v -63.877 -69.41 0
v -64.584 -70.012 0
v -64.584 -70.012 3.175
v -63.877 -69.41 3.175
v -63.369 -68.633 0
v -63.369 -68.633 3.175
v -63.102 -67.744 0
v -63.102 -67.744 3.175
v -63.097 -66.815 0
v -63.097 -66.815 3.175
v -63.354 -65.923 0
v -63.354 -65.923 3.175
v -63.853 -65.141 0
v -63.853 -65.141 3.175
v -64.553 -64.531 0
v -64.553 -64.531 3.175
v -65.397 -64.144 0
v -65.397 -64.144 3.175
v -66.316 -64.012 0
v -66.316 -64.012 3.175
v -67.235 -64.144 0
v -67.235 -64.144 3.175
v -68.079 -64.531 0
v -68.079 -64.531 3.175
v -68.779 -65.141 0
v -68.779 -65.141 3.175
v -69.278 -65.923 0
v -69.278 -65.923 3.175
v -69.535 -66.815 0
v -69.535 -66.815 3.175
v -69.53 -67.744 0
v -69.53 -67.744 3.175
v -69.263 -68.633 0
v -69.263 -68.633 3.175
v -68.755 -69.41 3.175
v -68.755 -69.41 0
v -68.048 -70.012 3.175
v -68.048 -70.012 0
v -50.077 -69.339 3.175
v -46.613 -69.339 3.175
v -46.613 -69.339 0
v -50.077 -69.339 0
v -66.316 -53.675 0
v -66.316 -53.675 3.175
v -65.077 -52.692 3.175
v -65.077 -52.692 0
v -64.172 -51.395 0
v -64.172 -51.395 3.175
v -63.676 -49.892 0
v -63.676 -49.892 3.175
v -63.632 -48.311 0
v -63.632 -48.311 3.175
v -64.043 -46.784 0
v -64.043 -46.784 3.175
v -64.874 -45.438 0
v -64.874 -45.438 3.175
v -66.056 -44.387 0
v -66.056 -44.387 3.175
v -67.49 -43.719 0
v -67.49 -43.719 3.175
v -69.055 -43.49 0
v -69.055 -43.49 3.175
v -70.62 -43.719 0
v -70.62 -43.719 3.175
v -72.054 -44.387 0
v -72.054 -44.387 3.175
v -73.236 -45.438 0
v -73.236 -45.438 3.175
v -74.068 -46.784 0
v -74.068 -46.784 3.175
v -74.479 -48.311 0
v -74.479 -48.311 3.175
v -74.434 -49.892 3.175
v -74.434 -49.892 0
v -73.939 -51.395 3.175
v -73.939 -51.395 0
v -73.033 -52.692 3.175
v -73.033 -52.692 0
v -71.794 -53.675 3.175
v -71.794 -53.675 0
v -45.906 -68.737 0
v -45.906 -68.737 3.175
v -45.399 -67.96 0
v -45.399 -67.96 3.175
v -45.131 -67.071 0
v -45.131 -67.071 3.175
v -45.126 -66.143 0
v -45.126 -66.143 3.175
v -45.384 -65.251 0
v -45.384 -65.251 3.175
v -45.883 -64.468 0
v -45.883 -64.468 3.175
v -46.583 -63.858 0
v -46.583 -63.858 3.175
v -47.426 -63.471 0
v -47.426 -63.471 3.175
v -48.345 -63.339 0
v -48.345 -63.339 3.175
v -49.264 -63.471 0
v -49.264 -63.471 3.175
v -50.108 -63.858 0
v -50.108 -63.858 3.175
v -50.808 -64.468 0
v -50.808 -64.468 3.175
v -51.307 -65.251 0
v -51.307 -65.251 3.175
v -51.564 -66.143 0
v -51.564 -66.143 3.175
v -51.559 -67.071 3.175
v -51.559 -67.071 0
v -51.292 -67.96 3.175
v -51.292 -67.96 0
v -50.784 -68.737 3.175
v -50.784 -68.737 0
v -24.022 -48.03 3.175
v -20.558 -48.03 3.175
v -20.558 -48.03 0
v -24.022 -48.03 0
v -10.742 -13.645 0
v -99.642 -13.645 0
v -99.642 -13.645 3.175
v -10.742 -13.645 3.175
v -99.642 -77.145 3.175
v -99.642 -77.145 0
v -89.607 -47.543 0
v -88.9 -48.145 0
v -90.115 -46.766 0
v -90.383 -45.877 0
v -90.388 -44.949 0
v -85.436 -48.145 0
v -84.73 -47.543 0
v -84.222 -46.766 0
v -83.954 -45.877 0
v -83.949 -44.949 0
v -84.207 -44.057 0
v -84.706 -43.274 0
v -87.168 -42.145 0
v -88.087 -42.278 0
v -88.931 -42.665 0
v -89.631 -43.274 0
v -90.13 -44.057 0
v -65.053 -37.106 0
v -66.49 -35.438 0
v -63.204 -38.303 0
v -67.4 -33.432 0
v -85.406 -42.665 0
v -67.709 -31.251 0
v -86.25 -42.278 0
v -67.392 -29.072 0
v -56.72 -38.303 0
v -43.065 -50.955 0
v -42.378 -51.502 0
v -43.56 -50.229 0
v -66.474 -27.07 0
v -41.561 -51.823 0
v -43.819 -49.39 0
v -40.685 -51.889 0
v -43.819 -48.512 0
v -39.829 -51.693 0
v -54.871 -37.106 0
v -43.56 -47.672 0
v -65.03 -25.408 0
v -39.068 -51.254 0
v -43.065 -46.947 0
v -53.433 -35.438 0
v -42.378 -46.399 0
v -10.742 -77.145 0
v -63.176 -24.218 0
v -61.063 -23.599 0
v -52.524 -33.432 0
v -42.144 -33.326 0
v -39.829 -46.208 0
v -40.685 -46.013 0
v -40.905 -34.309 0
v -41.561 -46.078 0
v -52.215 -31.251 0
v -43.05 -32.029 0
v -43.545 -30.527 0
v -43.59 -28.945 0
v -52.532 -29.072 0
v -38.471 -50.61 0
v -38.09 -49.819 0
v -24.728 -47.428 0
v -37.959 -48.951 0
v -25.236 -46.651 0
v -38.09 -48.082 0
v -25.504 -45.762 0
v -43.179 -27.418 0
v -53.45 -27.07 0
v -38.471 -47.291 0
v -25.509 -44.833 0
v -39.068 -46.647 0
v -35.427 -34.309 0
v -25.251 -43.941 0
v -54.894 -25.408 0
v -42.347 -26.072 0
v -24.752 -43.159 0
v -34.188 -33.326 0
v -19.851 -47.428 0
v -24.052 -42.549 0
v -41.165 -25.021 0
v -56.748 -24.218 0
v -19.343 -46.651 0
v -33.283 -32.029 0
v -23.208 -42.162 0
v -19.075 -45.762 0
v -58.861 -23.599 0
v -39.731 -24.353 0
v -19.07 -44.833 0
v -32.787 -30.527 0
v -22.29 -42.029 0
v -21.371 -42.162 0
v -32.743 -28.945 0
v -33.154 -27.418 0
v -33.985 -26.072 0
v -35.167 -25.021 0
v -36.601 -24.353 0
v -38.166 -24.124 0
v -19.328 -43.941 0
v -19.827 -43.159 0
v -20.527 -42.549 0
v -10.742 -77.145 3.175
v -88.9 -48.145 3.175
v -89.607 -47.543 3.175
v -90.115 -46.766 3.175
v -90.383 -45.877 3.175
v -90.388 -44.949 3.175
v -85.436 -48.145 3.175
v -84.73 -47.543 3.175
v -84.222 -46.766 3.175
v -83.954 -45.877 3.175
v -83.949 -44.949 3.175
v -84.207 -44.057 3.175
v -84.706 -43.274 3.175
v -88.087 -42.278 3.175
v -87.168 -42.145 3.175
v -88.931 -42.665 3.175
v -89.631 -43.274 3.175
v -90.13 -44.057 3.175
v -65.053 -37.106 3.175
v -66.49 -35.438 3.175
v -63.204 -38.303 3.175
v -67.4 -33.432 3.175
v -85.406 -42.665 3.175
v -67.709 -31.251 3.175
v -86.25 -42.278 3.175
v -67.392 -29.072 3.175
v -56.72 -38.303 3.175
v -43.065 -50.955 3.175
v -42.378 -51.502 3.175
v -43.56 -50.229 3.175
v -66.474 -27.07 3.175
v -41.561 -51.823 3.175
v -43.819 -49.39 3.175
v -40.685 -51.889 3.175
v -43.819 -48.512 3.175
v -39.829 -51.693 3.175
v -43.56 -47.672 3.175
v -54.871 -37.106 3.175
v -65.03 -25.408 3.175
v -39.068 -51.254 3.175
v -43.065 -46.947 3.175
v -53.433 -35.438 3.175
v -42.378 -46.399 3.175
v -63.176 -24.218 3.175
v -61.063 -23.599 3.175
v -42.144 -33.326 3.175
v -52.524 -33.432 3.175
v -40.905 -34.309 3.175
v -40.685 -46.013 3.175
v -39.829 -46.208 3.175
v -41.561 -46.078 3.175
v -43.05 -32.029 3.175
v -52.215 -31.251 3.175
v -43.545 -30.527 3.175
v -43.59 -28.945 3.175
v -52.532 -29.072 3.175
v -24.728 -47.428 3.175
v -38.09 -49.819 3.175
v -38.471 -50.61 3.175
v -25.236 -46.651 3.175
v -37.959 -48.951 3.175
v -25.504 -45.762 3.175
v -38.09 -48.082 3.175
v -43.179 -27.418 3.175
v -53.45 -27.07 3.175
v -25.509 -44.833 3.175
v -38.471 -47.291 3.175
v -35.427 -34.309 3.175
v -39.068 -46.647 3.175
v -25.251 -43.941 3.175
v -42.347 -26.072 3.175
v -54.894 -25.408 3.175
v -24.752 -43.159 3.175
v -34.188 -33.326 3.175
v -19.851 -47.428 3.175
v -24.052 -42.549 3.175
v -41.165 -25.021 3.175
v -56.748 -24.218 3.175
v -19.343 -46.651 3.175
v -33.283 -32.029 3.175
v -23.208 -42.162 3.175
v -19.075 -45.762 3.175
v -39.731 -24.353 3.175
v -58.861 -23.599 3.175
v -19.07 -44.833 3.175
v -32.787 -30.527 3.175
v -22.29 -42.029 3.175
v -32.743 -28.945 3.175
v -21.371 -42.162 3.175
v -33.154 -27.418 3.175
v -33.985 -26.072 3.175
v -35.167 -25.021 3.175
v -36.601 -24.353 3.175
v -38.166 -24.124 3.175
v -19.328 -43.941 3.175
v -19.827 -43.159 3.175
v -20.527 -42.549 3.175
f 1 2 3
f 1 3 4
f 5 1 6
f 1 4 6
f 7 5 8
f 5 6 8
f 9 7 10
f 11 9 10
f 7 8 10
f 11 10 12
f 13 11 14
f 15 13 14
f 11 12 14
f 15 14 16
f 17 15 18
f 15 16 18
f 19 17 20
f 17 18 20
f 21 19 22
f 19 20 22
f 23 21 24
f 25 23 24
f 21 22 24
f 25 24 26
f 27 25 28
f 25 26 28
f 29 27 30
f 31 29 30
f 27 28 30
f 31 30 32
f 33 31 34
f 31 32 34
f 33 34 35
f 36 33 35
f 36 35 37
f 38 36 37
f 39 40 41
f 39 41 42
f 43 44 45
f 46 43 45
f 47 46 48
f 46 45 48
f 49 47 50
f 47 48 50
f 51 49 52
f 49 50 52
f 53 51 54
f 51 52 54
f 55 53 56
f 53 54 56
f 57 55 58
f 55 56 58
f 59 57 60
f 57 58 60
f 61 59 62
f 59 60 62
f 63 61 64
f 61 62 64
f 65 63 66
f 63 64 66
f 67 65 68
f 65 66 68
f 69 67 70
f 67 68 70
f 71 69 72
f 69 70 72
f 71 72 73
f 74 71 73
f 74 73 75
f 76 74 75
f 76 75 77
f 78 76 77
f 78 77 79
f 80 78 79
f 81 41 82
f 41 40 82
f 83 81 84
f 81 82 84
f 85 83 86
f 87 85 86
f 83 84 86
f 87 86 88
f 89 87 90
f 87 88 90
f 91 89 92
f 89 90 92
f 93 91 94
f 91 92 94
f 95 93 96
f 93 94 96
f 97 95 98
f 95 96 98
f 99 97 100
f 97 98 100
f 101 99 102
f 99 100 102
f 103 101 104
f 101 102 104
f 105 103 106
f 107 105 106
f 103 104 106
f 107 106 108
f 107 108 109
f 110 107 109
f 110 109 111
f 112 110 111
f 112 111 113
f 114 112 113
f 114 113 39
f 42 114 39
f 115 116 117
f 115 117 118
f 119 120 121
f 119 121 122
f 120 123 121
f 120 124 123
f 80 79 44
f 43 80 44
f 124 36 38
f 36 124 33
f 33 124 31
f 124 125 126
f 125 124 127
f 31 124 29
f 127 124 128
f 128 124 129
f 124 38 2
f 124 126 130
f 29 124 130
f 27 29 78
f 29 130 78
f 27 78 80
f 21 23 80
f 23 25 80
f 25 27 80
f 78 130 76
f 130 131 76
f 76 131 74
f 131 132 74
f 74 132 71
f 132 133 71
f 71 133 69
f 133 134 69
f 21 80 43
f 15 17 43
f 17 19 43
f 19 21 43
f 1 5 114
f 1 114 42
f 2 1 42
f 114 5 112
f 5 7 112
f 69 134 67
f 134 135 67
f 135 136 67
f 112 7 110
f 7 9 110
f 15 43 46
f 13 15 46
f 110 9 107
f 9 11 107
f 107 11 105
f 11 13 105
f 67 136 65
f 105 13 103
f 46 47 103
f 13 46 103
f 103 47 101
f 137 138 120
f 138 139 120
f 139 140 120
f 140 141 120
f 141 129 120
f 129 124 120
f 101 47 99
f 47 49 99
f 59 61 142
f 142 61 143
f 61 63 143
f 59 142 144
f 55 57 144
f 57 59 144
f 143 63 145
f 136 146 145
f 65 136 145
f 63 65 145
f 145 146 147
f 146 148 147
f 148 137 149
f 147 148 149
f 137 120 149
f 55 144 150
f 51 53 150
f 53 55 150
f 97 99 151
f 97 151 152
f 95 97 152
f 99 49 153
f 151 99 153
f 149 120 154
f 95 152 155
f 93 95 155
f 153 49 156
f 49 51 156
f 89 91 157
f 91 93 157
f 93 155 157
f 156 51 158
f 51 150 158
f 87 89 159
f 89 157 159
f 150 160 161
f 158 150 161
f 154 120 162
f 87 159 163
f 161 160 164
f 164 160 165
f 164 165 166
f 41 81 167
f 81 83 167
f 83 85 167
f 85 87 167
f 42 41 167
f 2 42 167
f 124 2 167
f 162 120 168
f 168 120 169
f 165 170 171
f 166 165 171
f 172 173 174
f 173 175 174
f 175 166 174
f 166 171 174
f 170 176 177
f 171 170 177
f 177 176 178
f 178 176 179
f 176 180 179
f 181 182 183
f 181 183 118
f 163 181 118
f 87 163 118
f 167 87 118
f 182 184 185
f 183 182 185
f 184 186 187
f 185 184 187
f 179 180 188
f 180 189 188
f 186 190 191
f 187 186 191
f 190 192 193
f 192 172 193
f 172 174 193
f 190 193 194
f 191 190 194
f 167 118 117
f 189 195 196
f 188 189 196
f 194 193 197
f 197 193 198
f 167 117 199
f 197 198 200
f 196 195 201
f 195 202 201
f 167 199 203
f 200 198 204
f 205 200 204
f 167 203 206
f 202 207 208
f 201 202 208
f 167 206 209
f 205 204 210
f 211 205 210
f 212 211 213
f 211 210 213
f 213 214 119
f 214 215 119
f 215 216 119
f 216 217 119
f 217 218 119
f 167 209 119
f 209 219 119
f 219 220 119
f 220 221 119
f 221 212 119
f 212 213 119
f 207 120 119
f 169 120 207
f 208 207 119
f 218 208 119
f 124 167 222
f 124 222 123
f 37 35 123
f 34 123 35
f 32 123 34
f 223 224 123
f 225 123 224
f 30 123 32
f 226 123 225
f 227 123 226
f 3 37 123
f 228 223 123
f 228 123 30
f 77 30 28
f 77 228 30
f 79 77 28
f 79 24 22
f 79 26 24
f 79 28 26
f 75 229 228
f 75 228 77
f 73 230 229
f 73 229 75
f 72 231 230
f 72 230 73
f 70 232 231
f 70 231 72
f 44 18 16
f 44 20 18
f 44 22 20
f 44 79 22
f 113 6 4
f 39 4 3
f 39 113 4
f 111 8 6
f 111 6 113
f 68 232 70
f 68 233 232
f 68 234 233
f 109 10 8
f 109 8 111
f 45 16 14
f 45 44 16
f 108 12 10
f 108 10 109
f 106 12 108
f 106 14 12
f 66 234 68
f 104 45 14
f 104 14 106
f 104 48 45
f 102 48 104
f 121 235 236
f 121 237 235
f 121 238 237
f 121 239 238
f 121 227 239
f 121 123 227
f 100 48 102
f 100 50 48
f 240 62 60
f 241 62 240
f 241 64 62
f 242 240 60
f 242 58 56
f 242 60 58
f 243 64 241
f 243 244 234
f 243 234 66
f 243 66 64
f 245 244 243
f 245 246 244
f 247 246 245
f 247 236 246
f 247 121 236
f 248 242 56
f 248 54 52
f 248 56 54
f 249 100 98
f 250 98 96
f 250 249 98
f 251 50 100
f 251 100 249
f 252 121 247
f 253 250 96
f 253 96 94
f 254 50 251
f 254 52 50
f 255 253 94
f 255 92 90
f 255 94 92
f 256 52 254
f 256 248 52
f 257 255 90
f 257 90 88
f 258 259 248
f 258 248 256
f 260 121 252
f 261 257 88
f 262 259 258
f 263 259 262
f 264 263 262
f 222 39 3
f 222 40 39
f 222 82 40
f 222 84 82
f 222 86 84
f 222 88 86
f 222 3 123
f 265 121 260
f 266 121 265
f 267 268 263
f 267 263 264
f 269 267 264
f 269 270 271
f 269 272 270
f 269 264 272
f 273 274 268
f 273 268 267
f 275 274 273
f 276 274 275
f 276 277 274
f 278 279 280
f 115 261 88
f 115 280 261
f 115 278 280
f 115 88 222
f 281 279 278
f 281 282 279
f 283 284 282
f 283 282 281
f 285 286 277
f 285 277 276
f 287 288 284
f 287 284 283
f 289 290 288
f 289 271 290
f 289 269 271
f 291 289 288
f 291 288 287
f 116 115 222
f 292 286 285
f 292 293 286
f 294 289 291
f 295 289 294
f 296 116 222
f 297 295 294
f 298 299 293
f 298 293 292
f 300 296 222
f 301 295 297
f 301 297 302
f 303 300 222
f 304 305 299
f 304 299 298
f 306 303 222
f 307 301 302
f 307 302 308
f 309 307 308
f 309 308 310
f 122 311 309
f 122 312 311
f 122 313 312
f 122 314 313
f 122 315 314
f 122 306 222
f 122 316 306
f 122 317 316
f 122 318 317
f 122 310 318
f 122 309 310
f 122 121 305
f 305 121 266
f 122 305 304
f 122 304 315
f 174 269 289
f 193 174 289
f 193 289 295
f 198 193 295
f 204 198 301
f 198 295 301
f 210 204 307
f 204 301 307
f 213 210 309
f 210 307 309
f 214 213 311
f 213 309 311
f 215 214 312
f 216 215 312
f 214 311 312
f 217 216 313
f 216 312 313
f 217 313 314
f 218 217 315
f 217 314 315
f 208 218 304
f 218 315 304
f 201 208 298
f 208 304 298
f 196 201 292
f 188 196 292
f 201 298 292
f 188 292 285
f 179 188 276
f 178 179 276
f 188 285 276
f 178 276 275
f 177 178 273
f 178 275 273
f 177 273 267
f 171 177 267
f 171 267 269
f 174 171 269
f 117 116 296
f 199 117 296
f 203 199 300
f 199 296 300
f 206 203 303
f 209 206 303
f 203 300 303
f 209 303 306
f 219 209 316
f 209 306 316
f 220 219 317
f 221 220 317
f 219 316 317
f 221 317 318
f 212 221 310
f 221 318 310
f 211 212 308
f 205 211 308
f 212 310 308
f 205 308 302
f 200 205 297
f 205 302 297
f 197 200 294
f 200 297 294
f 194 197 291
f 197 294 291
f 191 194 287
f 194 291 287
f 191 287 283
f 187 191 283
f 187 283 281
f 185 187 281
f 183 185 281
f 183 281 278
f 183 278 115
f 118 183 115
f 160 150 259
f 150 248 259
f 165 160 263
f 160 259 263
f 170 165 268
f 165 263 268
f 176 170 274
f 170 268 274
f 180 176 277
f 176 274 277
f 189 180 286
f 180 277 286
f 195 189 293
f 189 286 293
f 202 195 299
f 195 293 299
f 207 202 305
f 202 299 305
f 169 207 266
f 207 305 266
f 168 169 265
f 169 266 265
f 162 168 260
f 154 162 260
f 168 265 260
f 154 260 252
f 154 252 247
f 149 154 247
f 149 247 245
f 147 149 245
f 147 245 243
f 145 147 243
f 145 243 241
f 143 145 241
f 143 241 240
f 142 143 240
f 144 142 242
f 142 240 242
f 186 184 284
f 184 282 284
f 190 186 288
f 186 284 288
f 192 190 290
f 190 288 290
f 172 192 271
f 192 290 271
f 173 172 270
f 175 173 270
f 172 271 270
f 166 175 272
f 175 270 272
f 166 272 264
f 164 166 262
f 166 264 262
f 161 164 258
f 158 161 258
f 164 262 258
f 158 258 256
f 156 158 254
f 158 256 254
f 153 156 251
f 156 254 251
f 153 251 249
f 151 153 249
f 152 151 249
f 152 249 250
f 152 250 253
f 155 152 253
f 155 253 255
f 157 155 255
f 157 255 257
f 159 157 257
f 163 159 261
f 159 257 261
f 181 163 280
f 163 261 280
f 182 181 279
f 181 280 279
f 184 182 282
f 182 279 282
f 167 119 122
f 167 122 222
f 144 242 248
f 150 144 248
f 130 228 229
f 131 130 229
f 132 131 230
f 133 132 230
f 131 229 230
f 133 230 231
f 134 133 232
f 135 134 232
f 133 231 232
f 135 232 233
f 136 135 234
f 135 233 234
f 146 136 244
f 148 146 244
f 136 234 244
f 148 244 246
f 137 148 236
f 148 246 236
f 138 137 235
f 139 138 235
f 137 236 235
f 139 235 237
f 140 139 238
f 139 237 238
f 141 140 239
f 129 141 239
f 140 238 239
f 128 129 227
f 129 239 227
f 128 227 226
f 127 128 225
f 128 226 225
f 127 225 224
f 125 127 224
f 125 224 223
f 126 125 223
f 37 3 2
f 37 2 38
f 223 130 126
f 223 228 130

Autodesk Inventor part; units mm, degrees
ref_plane "YZ Plane" through (0, 0, 0) normal (1, 0, 0) x (0, 1, 0)
ref_plane "XZ Plane" through (0, 0, 0) normal (0, 1, 0) x (-1, 0, 0)
ref_plane "XY Plane" through (0, 0, 0) normal (0, 0, 1) x (1, 0, 0)
sketch "Sketch1" plane through (0, 0, 0) normal (0, 0, 1) x (1, 0, 0)
  line L0 (-99.6423, -13.6452) -> (-10.7423, -13.6452)
  line L1 (-10.7423, -13.6452) -> (-10.7423, -77.1452)
  line L2 (-10.7423, -77.1452) -> (-99.6423, -77.1452)
  line L3 (-99.6423, -77.1452) -> (-99.6423, -13.6452)
  point P0 (0, 0)
  dimension "d0" = 88.9
  dimension "d1" = 63.5
extrude "Extrusion1" add sketch "Sketch1" along normal blind 3.175
sketch "Sketch2" plane through (0, 0, 3.175) normal (0, 0, 1) x (1, 0, 0)
  line L0 (-99.6423, -77.1452) -> (-10.7423, -77.1452) projected
  line L1 (-10.7423, -13.6452) -> (-99.6423, -13.6452) projected
  circle A0 centre (-59.962, -31.2669) radius 10.3124 construction
  arc A1 (-56.7195, -38.3027) -> (-63.2044, -38.3027) centre (-59.962, -31.2669) ccw
  circle A2 centre (-69.0552, -48.9507) radius 9.0932 construction
  arc A3 (-66.3161, -53.6751) -> (-71.7943, -53.6751) centre (-69.0552, -48.9507) ccw
  circle A4 centre (-40.9053, -48.9507) radius 5.2451 construction
  circle A5 centre (-40.9053, -48.9507) radius 2.9464
  line L2 (-63.2044, -38.3027) -> (-56.7195, -38.3027)
  line L3 (-71.7943, -53.6751) -> (-66.3161, -53.6751)
  circle A6 centre (-38.1662, -29.5849) radius 9.0932 construction
  arc A7 (-35.4272, -34.3093) -> (-40.9053, -34.3093) centre (-38.1662, -29.5849) ccw
  line L4 (-40.9053, -34.3093) -> (-35.4272, -34.3093)
  arc A8 (-85.4364, -48.1452) -> (-88.9005, -48.1452) centre (-87.1685, -45.3952) ccw
  line L5 (-85.4364, -48.1452) -> (-88.9005, -48.1452)
  circle A9 centre (-87.1685, -45.3952) radius 5.5 construction
  arc A10 (-64.584, -70.0116) -> (-68.0481, -70.0116) centre (-66.3161, -67.2616) ccw
  line L6 (-64.584, -70.0116) -> (-68.0481, -70.0116)
  circle A11 centre (-66.3161, -67.2616) radius 5.5 construction
  arc A12 (-46.6132, -69.3388) -> (-50.0773, -69.3388) centre (-48.3452, -66.5888) ccw
  line L7 (-46.6132, -69.3388) -> (-50.0773, -69.3388)
  circle A13 centre (-48.3452, -66.5888) radius 5.5 construction
  arc A14 (-20.5575, -48.0295) -> (-24.0216, -48.0295) centre (-22.2896, -45.2795) ccw
  line L8 (-20.5575, -48.0295) -> (-24.0216, -48.0295)
  circle A15 centre (-22.2896, -45.2795) radius 5.5 construction
  point P0 (0, 0)
  dimension "d18" = 20.6248
  dimension "d19" = 15.494
  dimension "d20" = 18.1864
  dimension "d21" = 10.922
  dimension "d22" = 10.4902
  dimension "d23" = 5.8928
  dimension "d24" = 7.0358
  dimension "d25" = 4.7244
  dimension "d26" = 18.1864
  dimension "d27" = 10.922
  dimension "d28" = 4.7244
  dimension "d32" = 28.1945
  dimension "d36" = 6.5
  dimension "d37" = 2.75
  dimension "d38" = 11
  dimension "d39" = 6.5
  dimension "d40" = 2.75
  dimension "d41" = 11
  dimension "d42" = 6.5
  dimension "d43" = 2.75
  dimension "d44" = 11
  dimension "d45" = 6.5
  dimension "d46" = 2.75
  dimension "d47" = 11
extrude "Extrusion2" cut sketch "Sketch2" against normal blind 6.35
properties part number "DishFront_BackPlate"
